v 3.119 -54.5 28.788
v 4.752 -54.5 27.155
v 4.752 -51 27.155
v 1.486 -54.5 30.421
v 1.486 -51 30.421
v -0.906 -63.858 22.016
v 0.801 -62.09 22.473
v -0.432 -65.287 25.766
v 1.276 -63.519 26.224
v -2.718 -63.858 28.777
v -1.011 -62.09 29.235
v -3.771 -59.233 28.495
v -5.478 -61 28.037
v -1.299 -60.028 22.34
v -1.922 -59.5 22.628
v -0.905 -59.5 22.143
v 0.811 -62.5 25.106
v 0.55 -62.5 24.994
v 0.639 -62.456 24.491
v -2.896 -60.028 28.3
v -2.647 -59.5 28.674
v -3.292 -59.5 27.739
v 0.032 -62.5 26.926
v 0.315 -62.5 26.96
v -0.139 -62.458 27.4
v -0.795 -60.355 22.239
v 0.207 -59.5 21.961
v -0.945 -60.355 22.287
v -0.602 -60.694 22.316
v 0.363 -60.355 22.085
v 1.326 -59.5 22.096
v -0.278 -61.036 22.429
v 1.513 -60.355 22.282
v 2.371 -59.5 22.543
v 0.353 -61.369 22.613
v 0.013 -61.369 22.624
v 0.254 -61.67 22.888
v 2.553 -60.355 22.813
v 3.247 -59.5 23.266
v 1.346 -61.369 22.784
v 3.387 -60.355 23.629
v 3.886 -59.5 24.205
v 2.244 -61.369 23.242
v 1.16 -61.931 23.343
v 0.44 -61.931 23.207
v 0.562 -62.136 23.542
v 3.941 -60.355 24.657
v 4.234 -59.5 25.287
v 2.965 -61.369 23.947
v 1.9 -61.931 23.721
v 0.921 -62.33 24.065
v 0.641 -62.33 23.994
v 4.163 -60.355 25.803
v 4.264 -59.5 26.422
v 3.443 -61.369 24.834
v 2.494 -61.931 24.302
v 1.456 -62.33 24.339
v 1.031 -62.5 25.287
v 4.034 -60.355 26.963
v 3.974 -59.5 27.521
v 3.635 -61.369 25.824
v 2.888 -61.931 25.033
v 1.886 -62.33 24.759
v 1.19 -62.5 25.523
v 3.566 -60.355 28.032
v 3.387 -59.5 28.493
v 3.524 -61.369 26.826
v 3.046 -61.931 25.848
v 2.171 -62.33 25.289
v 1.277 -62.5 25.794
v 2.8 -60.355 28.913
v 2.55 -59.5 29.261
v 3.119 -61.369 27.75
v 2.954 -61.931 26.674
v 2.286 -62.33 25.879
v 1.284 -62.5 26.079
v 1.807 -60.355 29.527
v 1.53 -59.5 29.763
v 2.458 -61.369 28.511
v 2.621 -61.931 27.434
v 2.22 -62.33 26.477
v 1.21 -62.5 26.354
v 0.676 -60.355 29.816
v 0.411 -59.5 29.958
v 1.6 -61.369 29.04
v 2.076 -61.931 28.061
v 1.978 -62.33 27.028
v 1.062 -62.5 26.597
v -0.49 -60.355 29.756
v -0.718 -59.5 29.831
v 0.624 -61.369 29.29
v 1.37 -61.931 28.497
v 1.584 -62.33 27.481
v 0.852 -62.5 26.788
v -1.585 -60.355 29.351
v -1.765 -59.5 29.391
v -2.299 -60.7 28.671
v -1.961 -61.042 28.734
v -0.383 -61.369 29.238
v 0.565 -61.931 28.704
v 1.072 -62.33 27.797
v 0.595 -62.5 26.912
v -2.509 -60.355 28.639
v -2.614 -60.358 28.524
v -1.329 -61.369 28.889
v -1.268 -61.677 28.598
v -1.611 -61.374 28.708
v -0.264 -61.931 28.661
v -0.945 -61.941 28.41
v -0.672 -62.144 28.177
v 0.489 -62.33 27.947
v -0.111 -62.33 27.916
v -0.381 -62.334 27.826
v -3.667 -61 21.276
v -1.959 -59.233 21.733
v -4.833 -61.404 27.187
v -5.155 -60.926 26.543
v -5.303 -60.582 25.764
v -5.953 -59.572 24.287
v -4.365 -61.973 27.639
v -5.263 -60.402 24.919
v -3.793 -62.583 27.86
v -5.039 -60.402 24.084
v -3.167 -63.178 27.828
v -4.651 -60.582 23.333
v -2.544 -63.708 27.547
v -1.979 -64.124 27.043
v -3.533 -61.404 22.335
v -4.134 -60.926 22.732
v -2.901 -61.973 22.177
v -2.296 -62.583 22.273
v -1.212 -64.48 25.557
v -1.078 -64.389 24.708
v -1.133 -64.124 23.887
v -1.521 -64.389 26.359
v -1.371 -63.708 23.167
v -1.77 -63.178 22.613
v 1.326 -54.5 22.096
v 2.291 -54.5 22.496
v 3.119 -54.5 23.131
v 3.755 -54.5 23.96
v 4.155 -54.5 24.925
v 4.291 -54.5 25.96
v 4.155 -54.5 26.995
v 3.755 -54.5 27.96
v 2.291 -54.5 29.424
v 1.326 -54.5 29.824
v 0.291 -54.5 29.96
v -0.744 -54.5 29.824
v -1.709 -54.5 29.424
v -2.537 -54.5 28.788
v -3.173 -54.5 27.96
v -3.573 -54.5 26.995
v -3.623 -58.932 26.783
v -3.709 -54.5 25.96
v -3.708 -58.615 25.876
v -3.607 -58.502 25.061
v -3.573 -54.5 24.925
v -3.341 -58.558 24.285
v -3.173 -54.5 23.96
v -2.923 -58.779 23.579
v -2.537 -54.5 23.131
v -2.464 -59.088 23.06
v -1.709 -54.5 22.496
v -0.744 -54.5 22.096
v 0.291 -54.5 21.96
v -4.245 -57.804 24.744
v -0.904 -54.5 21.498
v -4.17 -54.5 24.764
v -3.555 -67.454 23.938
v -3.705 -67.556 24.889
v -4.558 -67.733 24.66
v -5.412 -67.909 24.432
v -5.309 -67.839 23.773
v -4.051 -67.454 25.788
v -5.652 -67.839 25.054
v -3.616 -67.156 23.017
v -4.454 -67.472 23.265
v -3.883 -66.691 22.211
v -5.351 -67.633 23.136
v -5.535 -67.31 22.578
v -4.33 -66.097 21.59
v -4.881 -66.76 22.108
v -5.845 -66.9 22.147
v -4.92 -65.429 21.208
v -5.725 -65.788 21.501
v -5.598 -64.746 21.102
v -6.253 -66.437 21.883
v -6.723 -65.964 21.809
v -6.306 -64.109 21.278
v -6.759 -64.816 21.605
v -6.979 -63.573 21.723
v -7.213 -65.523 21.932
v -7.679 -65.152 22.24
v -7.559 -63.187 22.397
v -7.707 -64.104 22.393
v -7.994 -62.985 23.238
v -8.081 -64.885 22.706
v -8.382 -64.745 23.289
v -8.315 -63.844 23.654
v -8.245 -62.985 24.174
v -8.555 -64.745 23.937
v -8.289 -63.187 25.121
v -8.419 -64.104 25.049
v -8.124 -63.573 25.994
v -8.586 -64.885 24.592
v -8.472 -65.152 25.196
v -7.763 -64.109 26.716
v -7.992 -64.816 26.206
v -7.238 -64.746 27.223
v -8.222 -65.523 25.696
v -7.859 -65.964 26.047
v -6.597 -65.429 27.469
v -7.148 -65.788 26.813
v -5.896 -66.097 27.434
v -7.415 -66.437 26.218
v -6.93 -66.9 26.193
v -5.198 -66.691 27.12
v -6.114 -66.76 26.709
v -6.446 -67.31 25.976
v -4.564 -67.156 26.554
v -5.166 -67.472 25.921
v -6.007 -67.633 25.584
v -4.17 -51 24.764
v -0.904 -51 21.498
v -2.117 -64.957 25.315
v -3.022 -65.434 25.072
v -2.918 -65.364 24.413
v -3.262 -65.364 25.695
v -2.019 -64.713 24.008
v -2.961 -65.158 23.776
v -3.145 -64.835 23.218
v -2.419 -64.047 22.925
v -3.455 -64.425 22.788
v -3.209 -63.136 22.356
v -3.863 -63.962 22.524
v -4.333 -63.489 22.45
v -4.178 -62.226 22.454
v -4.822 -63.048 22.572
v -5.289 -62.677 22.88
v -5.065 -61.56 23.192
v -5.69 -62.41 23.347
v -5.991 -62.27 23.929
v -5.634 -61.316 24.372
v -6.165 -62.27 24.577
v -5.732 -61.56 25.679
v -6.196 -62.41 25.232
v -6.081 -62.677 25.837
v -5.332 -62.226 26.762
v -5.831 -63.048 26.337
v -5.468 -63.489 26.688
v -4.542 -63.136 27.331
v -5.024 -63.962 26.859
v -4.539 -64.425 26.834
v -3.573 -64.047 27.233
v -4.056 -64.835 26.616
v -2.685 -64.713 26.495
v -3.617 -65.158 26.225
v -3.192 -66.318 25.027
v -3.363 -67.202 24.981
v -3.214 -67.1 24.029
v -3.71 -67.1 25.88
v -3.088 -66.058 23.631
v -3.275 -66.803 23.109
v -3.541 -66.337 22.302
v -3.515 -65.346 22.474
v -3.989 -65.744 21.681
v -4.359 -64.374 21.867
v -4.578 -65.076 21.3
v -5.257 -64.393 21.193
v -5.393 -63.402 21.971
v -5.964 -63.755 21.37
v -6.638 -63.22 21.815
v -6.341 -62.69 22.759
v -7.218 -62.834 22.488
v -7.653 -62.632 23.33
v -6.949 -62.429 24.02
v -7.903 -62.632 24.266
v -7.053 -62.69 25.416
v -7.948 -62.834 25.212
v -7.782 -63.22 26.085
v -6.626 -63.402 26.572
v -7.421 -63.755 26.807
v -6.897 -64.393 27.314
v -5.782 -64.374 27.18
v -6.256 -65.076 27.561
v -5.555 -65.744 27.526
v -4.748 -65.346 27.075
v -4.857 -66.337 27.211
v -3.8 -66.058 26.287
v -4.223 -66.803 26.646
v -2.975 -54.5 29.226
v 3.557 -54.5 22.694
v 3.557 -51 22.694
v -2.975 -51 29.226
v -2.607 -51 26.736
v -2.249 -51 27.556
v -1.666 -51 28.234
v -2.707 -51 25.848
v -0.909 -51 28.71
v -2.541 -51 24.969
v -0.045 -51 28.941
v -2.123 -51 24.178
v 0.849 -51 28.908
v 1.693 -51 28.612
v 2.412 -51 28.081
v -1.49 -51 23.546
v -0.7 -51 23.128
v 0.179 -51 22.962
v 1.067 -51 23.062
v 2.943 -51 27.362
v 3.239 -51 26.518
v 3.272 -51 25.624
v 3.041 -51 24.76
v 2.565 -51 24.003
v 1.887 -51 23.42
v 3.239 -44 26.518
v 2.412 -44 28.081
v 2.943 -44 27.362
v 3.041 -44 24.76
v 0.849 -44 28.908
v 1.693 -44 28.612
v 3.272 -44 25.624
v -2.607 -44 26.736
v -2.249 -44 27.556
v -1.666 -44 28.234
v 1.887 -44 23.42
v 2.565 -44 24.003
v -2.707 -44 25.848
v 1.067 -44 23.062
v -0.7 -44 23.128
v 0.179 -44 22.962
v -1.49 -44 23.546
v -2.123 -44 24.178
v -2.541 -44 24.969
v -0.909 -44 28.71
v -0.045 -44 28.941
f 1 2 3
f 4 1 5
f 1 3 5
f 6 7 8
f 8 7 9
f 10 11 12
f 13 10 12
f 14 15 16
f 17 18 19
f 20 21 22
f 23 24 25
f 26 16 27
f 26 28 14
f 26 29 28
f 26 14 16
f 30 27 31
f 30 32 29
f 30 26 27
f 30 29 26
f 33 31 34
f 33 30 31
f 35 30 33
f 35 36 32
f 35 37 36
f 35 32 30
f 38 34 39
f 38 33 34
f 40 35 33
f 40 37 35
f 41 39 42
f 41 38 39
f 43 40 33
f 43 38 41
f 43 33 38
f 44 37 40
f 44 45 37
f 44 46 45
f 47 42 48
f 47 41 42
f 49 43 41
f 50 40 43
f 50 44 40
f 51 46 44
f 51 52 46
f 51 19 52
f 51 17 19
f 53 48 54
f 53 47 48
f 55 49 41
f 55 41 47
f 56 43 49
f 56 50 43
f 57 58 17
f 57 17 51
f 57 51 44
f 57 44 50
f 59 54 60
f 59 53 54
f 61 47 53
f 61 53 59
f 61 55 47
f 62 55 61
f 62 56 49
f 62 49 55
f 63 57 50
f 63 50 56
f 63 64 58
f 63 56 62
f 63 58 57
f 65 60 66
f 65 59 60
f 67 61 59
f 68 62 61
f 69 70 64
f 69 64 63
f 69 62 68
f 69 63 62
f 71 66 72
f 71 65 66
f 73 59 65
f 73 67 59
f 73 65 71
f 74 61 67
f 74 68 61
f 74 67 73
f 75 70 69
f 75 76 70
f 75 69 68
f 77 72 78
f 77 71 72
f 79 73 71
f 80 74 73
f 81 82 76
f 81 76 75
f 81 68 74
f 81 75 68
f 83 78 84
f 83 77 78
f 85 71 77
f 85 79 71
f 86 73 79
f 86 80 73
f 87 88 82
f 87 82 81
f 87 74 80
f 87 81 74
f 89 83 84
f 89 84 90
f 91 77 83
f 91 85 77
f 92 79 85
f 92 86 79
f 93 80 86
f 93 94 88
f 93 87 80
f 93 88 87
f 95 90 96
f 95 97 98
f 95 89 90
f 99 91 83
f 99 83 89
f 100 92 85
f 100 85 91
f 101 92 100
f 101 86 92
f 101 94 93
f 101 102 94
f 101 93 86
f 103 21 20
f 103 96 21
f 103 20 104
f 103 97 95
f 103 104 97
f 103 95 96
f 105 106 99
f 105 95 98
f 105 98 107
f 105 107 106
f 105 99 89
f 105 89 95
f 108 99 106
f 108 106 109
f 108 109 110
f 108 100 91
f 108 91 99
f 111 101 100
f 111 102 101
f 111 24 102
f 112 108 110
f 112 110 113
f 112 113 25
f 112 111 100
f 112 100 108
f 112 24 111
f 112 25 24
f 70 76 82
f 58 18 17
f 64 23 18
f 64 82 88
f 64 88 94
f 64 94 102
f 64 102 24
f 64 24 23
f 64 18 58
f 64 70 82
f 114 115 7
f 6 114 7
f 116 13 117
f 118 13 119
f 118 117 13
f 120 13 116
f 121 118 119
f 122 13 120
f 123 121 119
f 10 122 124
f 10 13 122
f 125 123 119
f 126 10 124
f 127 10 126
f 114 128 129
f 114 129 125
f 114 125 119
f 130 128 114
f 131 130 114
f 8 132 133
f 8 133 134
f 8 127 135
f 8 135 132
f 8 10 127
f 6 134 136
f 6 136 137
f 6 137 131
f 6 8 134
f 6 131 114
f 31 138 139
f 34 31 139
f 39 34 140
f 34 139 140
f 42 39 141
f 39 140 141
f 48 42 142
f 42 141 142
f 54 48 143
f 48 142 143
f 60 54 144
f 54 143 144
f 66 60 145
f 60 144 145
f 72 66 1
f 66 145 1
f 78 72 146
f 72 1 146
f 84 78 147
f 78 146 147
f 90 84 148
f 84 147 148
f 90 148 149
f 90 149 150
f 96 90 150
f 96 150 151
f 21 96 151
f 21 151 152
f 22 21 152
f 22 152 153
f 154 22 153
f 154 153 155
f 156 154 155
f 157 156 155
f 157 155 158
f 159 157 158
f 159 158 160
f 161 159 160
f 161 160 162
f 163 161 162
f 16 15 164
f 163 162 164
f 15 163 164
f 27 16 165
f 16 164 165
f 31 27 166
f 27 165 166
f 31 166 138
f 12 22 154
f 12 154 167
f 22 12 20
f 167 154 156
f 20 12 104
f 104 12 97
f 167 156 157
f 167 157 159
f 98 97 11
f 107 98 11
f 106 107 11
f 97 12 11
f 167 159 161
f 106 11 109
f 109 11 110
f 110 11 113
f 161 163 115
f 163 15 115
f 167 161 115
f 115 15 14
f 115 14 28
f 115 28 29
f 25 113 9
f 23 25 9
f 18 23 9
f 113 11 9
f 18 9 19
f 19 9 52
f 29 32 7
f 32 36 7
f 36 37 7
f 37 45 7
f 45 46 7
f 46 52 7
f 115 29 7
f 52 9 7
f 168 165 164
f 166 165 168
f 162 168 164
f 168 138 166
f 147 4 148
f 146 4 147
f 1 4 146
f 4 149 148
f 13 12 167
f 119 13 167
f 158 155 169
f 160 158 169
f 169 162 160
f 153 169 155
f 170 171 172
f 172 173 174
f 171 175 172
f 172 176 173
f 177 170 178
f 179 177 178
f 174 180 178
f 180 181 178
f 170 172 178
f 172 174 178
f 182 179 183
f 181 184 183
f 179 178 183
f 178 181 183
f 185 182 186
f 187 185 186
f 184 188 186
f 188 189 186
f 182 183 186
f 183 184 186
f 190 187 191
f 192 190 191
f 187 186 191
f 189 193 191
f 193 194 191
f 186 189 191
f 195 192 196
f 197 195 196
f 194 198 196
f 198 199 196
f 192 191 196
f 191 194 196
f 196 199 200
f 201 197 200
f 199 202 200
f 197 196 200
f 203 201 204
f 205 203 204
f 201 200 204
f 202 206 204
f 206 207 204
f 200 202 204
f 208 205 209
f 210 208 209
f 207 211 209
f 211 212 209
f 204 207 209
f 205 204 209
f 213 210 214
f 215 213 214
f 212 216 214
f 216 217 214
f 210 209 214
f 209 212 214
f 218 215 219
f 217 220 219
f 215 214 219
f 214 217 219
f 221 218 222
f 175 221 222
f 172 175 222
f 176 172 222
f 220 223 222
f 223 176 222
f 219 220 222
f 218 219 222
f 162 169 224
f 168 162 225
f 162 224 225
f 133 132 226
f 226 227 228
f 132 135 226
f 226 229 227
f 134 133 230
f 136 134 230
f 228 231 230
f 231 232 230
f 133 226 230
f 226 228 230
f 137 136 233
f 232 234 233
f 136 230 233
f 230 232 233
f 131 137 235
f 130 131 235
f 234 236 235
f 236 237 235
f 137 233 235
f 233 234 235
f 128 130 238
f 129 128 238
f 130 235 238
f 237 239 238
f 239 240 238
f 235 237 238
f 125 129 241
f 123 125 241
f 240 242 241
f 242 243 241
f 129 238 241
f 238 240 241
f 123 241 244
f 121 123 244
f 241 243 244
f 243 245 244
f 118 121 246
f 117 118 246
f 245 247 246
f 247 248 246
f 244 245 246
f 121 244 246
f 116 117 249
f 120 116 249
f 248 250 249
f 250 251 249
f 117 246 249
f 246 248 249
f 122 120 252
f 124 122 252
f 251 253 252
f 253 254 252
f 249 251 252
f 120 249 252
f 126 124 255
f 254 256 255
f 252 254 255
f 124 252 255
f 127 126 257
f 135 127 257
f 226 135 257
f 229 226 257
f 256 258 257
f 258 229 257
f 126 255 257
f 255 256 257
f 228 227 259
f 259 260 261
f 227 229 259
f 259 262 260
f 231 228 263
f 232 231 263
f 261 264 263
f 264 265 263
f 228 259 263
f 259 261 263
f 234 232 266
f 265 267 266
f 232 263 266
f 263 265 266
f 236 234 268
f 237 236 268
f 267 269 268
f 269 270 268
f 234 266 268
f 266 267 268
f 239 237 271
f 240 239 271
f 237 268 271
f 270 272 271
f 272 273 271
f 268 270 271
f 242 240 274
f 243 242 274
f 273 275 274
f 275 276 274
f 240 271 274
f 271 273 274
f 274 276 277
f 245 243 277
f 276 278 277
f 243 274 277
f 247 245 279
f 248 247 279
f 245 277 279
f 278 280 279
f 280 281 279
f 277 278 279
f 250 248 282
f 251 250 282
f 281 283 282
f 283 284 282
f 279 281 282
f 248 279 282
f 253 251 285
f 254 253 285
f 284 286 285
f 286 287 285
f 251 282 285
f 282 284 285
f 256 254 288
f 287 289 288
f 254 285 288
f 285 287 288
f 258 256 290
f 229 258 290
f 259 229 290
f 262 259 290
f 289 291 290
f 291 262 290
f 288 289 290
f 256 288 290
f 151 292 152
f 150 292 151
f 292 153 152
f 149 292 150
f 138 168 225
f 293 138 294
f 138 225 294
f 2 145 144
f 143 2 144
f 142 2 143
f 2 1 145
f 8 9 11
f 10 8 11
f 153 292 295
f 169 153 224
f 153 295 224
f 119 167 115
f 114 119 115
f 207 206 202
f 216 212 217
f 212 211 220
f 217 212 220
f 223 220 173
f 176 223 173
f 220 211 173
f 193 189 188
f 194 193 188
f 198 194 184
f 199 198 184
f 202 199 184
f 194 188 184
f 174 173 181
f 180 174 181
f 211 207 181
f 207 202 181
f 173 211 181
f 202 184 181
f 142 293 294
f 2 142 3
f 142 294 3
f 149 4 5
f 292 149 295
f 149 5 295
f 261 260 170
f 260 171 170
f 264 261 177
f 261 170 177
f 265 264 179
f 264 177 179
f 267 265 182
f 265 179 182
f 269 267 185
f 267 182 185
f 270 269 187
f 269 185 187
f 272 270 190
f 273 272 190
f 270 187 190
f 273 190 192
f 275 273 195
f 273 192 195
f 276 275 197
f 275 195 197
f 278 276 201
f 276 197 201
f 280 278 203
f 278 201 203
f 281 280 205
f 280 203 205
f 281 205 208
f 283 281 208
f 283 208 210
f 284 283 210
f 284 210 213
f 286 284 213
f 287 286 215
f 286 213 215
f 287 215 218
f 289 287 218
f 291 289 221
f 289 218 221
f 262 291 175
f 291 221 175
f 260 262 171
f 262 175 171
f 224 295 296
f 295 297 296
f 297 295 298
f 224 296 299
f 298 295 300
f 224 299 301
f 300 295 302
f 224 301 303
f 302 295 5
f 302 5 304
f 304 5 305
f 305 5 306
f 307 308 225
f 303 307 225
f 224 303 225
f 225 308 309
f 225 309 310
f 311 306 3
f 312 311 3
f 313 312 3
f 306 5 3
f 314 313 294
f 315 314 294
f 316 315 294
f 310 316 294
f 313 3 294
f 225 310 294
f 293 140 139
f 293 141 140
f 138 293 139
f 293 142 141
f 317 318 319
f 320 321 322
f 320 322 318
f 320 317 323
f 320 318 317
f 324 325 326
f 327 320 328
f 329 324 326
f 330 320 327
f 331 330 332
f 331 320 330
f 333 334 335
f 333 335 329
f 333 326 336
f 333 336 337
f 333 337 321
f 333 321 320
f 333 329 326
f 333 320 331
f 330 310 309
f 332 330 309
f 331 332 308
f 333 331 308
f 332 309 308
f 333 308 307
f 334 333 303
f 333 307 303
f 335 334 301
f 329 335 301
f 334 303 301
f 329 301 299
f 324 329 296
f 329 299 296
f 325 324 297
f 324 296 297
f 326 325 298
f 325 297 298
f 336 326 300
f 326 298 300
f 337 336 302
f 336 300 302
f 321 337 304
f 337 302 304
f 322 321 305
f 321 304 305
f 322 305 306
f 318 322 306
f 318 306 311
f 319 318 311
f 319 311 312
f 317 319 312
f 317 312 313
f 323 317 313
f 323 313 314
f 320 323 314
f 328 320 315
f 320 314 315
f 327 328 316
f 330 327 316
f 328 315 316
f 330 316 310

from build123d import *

# Parameters (mm, degrees)
SKETCH005_R         = 3
PAD002_DEPTH        = 7
PAD003_DEPTH        = 3.5
SKETCH007_R         = 4
PAD004_DEPTH        = 8
FILLET_R            = 3
PAD005_DEPTH        = 2.5
BODY001_ROLL_ANGLE  = -180
BODY001_PITCH_ANGLE = 75


with BuildPart() as part:
    # Sketch005 → Pad002 (new body)
    with BuildSketch(Plane.XZ):
        Circle(SKETCH005_R)
    extrude(amount=PAD002_DEPTH)

    # Sketch006 (on Face2 of Pad002) → Pad003 (join)
    with BuildSketch(Plane(origin=(0, 0, 0), x_dir=(1, 0, 0), z_dir=(0, 1, 0))):
        Polygon((4, -2.3094010768), (4, 2.3094010768), (0, 4.6188021535), (-4, 2.3094010768), (-4, -2.3094010768), (0, -4.6188021535), align=None)
    extrude(amount=PAD003_DEPTH)

    # Sketch007 (on Face5 of Pad003) → Pad004 (join)
    with BuildSketch(Plane(origin=(0, 3.5, 0), x_dir=(1, 0, 0), z_dir=(0, 1, 0))):
        Circle(SKETCH007_R)
    extrude(amount=PAD004_DEPTH)

    # Fillet
    fillet_edges = [part.edges().sort_by_distance(p)[0] for p in [
        (-4, 11.5, 0),
    ]]
    fillet(fillet_edges, radius=FILLET_R)

    # Sketch008 (on Plane of DatumPlane) → Pad005 (join)
    with BuildSketch(Plane(origin=(0, 11.5, 0), x_dir=(1, 0, 0), z_dir=(0, 0.7071067812, 0.7071067812))):
        Polygon((3.5, -4.6207259421), (3.5, -0.5792740579), (0, 1.4414518843), (-3.5, -0.5792740579), (-3.5, -4.6207259421), (0, -6.6414518843), align=None)
    extrude(amount=PAD005_DEPTH)

    # Sketch009 (on Plane of DatumPlane001) → Revolution (revolve)
    with BuildSketch(Plane(origin=(0, 7.517766953, 7.517766953), x_dir=(0, -0.7071067812, -0.7071067812), z_dir=(1, 0, 0))):
        Polygon((0, 8.4317279836), (-2, 7.7817279836), (-3.5, 8.7817279836), (-4, 8.7817279836), (-5.5, 7.7817279836), (-5.5, 5.5317279836), (0, 5.5317279836), align=None)
    revolve(axis=Axis((0, 11.4292893219, 3.6062445841), (0, -0.7071067812, -0.7071067812)))


with BuildPart() as part_1:
    # Body001 roll: moved
    add(part.part.rotate(Axis((0, 0, 0), (1, 0, 0)), BODY001_ROLL_ANGLE))


with BuildPart() as part_2:
    # Body001 pitch: moved
    add(part_1.part.rotate(Axis((0, 0, 0), (0, 1, 0)), BODY001_PITCH_ANGLE))


with BuildPart() as part_3:
    # Body001 placement: moved
    add(part_2.part.moved(Location((0.2910046565, -51, 25.9598789729))))


solid = part_3.part
